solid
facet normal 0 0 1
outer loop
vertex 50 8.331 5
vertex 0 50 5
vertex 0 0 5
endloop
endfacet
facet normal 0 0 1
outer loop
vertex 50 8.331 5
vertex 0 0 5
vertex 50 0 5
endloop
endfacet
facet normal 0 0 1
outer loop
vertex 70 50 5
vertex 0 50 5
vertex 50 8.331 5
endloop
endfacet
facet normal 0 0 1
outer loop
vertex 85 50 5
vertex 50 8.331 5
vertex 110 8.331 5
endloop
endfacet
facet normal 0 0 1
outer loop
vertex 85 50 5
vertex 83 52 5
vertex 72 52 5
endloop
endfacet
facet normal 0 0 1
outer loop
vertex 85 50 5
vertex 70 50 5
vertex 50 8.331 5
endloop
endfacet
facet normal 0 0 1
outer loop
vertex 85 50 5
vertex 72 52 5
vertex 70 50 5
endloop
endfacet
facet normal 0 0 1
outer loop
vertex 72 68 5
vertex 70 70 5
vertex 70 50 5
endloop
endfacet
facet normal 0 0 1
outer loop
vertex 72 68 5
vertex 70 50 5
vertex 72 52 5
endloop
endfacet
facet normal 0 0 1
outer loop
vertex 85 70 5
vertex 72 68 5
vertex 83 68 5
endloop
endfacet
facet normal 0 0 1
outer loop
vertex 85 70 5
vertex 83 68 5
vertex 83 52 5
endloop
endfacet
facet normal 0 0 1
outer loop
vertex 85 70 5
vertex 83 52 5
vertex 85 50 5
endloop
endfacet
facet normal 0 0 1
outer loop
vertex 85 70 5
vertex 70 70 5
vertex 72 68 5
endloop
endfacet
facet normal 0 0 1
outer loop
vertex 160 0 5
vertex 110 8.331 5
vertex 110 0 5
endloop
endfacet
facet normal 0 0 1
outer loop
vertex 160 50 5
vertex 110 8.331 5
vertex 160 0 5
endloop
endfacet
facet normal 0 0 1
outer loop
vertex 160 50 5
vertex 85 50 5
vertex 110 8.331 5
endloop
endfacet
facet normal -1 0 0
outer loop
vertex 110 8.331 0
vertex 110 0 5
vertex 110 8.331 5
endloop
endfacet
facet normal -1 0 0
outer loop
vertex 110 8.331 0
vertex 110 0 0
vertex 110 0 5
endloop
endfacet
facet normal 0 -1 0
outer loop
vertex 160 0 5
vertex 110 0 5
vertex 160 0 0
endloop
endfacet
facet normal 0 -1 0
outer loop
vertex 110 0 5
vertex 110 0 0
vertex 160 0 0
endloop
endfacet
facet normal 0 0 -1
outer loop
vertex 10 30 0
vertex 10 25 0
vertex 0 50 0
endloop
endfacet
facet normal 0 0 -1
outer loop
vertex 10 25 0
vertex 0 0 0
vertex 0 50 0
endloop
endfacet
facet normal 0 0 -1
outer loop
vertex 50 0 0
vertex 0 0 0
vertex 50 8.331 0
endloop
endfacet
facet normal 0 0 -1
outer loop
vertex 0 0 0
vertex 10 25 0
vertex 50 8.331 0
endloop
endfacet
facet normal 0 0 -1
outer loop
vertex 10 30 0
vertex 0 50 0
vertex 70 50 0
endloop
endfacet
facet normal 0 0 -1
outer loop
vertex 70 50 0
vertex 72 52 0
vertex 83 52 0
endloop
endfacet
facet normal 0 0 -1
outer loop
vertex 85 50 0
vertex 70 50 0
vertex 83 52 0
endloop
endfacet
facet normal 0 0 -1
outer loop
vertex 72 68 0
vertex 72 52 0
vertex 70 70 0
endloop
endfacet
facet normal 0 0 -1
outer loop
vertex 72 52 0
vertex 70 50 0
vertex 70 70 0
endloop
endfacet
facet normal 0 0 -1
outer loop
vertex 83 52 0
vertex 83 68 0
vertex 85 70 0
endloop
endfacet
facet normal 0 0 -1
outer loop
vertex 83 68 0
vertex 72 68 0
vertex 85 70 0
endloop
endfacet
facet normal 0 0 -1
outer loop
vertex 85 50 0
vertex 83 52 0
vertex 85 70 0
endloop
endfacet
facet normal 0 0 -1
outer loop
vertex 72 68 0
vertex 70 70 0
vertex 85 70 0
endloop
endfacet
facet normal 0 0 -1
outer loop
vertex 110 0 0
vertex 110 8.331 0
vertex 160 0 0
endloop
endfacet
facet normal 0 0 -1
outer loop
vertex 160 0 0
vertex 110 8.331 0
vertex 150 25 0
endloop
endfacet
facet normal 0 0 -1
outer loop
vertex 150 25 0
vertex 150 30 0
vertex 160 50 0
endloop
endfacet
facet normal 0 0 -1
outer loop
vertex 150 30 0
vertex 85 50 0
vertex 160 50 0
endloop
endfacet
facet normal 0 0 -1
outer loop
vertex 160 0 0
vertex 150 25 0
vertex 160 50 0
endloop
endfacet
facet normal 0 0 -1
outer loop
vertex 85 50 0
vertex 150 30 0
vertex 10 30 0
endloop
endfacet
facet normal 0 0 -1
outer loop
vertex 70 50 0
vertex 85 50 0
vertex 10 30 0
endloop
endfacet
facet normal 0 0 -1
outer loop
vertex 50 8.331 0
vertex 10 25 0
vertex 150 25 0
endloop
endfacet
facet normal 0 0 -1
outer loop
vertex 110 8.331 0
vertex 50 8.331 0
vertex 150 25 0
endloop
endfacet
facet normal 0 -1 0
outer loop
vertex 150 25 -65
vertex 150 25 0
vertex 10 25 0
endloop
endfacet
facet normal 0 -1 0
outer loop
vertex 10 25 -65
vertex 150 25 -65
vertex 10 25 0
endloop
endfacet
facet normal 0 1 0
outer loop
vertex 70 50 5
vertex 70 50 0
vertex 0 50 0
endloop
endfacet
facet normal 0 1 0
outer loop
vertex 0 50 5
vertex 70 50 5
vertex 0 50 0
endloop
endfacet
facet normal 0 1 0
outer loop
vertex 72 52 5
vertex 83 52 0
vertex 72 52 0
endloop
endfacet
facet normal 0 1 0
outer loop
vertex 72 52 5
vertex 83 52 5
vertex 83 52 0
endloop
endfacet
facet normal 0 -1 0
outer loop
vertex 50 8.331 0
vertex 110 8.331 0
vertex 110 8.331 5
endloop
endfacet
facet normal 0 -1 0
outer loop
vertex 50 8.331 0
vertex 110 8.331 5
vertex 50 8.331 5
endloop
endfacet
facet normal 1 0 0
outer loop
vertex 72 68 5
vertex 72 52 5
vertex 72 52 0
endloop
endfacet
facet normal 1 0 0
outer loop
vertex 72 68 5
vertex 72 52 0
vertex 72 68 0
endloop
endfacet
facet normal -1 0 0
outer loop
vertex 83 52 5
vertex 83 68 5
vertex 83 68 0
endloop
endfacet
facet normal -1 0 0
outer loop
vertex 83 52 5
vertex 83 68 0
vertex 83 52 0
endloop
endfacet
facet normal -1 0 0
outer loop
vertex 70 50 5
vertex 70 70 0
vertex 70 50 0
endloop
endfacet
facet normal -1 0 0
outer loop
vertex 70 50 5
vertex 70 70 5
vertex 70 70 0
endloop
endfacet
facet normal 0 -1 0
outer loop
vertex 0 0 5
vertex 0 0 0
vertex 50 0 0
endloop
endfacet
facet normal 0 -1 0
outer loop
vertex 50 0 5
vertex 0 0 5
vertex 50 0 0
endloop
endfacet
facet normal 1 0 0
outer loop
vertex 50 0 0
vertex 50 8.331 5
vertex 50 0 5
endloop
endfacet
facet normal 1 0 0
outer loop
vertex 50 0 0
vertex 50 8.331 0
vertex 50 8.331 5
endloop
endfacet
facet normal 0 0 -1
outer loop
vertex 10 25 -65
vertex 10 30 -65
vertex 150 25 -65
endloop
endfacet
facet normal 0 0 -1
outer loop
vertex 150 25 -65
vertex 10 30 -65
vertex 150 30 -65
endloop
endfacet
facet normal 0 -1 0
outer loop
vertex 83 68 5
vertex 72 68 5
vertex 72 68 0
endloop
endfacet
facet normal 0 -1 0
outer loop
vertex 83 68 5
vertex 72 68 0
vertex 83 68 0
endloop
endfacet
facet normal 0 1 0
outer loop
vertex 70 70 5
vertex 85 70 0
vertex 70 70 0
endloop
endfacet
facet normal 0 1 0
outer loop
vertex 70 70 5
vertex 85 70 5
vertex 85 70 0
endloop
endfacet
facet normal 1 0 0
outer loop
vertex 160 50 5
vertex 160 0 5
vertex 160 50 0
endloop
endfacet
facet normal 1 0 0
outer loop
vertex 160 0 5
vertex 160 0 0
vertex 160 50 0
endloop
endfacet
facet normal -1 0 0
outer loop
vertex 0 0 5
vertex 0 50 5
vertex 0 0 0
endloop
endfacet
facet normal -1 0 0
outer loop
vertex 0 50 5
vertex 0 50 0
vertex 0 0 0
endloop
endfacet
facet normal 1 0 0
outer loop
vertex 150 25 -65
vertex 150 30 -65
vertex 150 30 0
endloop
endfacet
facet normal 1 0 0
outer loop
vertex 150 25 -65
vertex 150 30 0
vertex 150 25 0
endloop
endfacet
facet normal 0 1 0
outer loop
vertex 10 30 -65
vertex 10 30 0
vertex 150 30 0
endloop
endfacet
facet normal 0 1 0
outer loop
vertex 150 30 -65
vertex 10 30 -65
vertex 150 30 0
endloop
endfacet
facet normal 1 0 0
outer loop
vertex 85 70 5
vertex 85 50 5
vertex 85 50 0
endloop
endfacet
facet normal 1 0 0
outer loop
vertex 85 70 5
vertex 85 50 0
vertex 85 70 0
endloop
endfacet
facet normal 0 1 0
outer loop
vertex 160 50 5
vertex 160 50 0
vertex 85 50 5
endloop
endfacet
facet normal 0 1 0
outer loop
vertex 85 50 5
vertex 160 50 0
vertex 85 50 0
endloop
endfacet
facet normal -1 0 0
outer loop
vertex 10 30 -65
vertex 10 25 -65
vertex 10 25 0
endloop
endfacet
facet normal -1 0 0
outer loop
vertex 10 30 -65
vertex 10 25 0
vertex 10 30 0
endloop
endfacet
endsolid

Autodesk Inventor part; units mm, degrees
ref_plane "YZ Plane" through (0, 0, 0) normal (1, 0, 0) x (0, 1, 0)
ref_plane "XZ Plane" through (0, 0, 0) normal (0, 1, 0) x (-1, 0, 0)
ref_plane "XY Plane" through (0, 0, 0) normal (0, 0, 1) x (1, 0, 0)
sketch "Sketch1" plane through (0, 0, 0) normal (0, 0, 1) x (1, 0, 0)
  line L0 (0, 0) -> (160, 0)
  line L1 (160, 0) -> (160, 50)
  line L2 (160, 50) -> (0, 50)
  line L3 (0, 50) -> (0, 0)
  line L4 (50, 0) -> (110, 0)
  line L5 (110, 0) -> (110, 8.3313)
  line L6 (110, 8.3313) -> (50, 8.3313)
  line L7 (50, 8.3313) -> (50, 0)
  line L8 (0, 50) -> (160, 50)
  line L9 (160, 50) -> (160, 45)
  line L10 (0, 45) -> (0, 50)
  line L11 (150, 50) -> (10, 50)
  line L12 (10, 30) -> (150, 30)
  line L13 (150, 30) -> (150, 25)
  line L14 (150, 25) -> (10, 25)
  line L15 (10, 25) -> (10, 30)
  dimension "d0" = 160
  dimension "d1" = 50
  dimension "d2" = 60
  dimension "d3" = 50
  dimension "d11" = 140
  dimension "d12" = 10
  dimension "d13" = 20
  dimension "d14" = 5
extrude "Extrusion1" add sketch "Sketch1" along normal blind 5 contours L3 L2 L1 L0 L5 L6 L7 | L12 L13 L14 L15
extrude "Extrusion2" add sketch "Sketch1" against normal blind 65 contours L12 L13 L14 L15
sketch "Sketch2" plane through (0, 0, 5) normal (0, 0, 1) x (1, 0, 0)
  line L0 (160, 50) -> (0, 50) projected
  line L1 (70, 50) -> (85, 50)
  line L2 (85, 50) -> (85, 70)
  line L3 (85, 70) -> (70, 70)
  line L4 (70, 70) -> (70, 50)
  line L5 (72, 68) -> (83, 68)
  line L6 (83, 68) -> (83, 52)
  line L7 (83, 52) -> (72, 52)
  line L8 (72, 52) -> (72, 68)
  point P0 (0, 0)
  dimension "d15" = 15
  dimension "d16" = 20
  dimension "d17" = 2
extrude "Extrusion3" add sketch "Sketch2" against normal blind 5
sketch "Sketch3" plane through (0, 0, 5) normal (0, 0, 1) x (1, 0, 0)
  point P0 (0, 0)
properties part number "COVER_1" material "ABS Plastic"
